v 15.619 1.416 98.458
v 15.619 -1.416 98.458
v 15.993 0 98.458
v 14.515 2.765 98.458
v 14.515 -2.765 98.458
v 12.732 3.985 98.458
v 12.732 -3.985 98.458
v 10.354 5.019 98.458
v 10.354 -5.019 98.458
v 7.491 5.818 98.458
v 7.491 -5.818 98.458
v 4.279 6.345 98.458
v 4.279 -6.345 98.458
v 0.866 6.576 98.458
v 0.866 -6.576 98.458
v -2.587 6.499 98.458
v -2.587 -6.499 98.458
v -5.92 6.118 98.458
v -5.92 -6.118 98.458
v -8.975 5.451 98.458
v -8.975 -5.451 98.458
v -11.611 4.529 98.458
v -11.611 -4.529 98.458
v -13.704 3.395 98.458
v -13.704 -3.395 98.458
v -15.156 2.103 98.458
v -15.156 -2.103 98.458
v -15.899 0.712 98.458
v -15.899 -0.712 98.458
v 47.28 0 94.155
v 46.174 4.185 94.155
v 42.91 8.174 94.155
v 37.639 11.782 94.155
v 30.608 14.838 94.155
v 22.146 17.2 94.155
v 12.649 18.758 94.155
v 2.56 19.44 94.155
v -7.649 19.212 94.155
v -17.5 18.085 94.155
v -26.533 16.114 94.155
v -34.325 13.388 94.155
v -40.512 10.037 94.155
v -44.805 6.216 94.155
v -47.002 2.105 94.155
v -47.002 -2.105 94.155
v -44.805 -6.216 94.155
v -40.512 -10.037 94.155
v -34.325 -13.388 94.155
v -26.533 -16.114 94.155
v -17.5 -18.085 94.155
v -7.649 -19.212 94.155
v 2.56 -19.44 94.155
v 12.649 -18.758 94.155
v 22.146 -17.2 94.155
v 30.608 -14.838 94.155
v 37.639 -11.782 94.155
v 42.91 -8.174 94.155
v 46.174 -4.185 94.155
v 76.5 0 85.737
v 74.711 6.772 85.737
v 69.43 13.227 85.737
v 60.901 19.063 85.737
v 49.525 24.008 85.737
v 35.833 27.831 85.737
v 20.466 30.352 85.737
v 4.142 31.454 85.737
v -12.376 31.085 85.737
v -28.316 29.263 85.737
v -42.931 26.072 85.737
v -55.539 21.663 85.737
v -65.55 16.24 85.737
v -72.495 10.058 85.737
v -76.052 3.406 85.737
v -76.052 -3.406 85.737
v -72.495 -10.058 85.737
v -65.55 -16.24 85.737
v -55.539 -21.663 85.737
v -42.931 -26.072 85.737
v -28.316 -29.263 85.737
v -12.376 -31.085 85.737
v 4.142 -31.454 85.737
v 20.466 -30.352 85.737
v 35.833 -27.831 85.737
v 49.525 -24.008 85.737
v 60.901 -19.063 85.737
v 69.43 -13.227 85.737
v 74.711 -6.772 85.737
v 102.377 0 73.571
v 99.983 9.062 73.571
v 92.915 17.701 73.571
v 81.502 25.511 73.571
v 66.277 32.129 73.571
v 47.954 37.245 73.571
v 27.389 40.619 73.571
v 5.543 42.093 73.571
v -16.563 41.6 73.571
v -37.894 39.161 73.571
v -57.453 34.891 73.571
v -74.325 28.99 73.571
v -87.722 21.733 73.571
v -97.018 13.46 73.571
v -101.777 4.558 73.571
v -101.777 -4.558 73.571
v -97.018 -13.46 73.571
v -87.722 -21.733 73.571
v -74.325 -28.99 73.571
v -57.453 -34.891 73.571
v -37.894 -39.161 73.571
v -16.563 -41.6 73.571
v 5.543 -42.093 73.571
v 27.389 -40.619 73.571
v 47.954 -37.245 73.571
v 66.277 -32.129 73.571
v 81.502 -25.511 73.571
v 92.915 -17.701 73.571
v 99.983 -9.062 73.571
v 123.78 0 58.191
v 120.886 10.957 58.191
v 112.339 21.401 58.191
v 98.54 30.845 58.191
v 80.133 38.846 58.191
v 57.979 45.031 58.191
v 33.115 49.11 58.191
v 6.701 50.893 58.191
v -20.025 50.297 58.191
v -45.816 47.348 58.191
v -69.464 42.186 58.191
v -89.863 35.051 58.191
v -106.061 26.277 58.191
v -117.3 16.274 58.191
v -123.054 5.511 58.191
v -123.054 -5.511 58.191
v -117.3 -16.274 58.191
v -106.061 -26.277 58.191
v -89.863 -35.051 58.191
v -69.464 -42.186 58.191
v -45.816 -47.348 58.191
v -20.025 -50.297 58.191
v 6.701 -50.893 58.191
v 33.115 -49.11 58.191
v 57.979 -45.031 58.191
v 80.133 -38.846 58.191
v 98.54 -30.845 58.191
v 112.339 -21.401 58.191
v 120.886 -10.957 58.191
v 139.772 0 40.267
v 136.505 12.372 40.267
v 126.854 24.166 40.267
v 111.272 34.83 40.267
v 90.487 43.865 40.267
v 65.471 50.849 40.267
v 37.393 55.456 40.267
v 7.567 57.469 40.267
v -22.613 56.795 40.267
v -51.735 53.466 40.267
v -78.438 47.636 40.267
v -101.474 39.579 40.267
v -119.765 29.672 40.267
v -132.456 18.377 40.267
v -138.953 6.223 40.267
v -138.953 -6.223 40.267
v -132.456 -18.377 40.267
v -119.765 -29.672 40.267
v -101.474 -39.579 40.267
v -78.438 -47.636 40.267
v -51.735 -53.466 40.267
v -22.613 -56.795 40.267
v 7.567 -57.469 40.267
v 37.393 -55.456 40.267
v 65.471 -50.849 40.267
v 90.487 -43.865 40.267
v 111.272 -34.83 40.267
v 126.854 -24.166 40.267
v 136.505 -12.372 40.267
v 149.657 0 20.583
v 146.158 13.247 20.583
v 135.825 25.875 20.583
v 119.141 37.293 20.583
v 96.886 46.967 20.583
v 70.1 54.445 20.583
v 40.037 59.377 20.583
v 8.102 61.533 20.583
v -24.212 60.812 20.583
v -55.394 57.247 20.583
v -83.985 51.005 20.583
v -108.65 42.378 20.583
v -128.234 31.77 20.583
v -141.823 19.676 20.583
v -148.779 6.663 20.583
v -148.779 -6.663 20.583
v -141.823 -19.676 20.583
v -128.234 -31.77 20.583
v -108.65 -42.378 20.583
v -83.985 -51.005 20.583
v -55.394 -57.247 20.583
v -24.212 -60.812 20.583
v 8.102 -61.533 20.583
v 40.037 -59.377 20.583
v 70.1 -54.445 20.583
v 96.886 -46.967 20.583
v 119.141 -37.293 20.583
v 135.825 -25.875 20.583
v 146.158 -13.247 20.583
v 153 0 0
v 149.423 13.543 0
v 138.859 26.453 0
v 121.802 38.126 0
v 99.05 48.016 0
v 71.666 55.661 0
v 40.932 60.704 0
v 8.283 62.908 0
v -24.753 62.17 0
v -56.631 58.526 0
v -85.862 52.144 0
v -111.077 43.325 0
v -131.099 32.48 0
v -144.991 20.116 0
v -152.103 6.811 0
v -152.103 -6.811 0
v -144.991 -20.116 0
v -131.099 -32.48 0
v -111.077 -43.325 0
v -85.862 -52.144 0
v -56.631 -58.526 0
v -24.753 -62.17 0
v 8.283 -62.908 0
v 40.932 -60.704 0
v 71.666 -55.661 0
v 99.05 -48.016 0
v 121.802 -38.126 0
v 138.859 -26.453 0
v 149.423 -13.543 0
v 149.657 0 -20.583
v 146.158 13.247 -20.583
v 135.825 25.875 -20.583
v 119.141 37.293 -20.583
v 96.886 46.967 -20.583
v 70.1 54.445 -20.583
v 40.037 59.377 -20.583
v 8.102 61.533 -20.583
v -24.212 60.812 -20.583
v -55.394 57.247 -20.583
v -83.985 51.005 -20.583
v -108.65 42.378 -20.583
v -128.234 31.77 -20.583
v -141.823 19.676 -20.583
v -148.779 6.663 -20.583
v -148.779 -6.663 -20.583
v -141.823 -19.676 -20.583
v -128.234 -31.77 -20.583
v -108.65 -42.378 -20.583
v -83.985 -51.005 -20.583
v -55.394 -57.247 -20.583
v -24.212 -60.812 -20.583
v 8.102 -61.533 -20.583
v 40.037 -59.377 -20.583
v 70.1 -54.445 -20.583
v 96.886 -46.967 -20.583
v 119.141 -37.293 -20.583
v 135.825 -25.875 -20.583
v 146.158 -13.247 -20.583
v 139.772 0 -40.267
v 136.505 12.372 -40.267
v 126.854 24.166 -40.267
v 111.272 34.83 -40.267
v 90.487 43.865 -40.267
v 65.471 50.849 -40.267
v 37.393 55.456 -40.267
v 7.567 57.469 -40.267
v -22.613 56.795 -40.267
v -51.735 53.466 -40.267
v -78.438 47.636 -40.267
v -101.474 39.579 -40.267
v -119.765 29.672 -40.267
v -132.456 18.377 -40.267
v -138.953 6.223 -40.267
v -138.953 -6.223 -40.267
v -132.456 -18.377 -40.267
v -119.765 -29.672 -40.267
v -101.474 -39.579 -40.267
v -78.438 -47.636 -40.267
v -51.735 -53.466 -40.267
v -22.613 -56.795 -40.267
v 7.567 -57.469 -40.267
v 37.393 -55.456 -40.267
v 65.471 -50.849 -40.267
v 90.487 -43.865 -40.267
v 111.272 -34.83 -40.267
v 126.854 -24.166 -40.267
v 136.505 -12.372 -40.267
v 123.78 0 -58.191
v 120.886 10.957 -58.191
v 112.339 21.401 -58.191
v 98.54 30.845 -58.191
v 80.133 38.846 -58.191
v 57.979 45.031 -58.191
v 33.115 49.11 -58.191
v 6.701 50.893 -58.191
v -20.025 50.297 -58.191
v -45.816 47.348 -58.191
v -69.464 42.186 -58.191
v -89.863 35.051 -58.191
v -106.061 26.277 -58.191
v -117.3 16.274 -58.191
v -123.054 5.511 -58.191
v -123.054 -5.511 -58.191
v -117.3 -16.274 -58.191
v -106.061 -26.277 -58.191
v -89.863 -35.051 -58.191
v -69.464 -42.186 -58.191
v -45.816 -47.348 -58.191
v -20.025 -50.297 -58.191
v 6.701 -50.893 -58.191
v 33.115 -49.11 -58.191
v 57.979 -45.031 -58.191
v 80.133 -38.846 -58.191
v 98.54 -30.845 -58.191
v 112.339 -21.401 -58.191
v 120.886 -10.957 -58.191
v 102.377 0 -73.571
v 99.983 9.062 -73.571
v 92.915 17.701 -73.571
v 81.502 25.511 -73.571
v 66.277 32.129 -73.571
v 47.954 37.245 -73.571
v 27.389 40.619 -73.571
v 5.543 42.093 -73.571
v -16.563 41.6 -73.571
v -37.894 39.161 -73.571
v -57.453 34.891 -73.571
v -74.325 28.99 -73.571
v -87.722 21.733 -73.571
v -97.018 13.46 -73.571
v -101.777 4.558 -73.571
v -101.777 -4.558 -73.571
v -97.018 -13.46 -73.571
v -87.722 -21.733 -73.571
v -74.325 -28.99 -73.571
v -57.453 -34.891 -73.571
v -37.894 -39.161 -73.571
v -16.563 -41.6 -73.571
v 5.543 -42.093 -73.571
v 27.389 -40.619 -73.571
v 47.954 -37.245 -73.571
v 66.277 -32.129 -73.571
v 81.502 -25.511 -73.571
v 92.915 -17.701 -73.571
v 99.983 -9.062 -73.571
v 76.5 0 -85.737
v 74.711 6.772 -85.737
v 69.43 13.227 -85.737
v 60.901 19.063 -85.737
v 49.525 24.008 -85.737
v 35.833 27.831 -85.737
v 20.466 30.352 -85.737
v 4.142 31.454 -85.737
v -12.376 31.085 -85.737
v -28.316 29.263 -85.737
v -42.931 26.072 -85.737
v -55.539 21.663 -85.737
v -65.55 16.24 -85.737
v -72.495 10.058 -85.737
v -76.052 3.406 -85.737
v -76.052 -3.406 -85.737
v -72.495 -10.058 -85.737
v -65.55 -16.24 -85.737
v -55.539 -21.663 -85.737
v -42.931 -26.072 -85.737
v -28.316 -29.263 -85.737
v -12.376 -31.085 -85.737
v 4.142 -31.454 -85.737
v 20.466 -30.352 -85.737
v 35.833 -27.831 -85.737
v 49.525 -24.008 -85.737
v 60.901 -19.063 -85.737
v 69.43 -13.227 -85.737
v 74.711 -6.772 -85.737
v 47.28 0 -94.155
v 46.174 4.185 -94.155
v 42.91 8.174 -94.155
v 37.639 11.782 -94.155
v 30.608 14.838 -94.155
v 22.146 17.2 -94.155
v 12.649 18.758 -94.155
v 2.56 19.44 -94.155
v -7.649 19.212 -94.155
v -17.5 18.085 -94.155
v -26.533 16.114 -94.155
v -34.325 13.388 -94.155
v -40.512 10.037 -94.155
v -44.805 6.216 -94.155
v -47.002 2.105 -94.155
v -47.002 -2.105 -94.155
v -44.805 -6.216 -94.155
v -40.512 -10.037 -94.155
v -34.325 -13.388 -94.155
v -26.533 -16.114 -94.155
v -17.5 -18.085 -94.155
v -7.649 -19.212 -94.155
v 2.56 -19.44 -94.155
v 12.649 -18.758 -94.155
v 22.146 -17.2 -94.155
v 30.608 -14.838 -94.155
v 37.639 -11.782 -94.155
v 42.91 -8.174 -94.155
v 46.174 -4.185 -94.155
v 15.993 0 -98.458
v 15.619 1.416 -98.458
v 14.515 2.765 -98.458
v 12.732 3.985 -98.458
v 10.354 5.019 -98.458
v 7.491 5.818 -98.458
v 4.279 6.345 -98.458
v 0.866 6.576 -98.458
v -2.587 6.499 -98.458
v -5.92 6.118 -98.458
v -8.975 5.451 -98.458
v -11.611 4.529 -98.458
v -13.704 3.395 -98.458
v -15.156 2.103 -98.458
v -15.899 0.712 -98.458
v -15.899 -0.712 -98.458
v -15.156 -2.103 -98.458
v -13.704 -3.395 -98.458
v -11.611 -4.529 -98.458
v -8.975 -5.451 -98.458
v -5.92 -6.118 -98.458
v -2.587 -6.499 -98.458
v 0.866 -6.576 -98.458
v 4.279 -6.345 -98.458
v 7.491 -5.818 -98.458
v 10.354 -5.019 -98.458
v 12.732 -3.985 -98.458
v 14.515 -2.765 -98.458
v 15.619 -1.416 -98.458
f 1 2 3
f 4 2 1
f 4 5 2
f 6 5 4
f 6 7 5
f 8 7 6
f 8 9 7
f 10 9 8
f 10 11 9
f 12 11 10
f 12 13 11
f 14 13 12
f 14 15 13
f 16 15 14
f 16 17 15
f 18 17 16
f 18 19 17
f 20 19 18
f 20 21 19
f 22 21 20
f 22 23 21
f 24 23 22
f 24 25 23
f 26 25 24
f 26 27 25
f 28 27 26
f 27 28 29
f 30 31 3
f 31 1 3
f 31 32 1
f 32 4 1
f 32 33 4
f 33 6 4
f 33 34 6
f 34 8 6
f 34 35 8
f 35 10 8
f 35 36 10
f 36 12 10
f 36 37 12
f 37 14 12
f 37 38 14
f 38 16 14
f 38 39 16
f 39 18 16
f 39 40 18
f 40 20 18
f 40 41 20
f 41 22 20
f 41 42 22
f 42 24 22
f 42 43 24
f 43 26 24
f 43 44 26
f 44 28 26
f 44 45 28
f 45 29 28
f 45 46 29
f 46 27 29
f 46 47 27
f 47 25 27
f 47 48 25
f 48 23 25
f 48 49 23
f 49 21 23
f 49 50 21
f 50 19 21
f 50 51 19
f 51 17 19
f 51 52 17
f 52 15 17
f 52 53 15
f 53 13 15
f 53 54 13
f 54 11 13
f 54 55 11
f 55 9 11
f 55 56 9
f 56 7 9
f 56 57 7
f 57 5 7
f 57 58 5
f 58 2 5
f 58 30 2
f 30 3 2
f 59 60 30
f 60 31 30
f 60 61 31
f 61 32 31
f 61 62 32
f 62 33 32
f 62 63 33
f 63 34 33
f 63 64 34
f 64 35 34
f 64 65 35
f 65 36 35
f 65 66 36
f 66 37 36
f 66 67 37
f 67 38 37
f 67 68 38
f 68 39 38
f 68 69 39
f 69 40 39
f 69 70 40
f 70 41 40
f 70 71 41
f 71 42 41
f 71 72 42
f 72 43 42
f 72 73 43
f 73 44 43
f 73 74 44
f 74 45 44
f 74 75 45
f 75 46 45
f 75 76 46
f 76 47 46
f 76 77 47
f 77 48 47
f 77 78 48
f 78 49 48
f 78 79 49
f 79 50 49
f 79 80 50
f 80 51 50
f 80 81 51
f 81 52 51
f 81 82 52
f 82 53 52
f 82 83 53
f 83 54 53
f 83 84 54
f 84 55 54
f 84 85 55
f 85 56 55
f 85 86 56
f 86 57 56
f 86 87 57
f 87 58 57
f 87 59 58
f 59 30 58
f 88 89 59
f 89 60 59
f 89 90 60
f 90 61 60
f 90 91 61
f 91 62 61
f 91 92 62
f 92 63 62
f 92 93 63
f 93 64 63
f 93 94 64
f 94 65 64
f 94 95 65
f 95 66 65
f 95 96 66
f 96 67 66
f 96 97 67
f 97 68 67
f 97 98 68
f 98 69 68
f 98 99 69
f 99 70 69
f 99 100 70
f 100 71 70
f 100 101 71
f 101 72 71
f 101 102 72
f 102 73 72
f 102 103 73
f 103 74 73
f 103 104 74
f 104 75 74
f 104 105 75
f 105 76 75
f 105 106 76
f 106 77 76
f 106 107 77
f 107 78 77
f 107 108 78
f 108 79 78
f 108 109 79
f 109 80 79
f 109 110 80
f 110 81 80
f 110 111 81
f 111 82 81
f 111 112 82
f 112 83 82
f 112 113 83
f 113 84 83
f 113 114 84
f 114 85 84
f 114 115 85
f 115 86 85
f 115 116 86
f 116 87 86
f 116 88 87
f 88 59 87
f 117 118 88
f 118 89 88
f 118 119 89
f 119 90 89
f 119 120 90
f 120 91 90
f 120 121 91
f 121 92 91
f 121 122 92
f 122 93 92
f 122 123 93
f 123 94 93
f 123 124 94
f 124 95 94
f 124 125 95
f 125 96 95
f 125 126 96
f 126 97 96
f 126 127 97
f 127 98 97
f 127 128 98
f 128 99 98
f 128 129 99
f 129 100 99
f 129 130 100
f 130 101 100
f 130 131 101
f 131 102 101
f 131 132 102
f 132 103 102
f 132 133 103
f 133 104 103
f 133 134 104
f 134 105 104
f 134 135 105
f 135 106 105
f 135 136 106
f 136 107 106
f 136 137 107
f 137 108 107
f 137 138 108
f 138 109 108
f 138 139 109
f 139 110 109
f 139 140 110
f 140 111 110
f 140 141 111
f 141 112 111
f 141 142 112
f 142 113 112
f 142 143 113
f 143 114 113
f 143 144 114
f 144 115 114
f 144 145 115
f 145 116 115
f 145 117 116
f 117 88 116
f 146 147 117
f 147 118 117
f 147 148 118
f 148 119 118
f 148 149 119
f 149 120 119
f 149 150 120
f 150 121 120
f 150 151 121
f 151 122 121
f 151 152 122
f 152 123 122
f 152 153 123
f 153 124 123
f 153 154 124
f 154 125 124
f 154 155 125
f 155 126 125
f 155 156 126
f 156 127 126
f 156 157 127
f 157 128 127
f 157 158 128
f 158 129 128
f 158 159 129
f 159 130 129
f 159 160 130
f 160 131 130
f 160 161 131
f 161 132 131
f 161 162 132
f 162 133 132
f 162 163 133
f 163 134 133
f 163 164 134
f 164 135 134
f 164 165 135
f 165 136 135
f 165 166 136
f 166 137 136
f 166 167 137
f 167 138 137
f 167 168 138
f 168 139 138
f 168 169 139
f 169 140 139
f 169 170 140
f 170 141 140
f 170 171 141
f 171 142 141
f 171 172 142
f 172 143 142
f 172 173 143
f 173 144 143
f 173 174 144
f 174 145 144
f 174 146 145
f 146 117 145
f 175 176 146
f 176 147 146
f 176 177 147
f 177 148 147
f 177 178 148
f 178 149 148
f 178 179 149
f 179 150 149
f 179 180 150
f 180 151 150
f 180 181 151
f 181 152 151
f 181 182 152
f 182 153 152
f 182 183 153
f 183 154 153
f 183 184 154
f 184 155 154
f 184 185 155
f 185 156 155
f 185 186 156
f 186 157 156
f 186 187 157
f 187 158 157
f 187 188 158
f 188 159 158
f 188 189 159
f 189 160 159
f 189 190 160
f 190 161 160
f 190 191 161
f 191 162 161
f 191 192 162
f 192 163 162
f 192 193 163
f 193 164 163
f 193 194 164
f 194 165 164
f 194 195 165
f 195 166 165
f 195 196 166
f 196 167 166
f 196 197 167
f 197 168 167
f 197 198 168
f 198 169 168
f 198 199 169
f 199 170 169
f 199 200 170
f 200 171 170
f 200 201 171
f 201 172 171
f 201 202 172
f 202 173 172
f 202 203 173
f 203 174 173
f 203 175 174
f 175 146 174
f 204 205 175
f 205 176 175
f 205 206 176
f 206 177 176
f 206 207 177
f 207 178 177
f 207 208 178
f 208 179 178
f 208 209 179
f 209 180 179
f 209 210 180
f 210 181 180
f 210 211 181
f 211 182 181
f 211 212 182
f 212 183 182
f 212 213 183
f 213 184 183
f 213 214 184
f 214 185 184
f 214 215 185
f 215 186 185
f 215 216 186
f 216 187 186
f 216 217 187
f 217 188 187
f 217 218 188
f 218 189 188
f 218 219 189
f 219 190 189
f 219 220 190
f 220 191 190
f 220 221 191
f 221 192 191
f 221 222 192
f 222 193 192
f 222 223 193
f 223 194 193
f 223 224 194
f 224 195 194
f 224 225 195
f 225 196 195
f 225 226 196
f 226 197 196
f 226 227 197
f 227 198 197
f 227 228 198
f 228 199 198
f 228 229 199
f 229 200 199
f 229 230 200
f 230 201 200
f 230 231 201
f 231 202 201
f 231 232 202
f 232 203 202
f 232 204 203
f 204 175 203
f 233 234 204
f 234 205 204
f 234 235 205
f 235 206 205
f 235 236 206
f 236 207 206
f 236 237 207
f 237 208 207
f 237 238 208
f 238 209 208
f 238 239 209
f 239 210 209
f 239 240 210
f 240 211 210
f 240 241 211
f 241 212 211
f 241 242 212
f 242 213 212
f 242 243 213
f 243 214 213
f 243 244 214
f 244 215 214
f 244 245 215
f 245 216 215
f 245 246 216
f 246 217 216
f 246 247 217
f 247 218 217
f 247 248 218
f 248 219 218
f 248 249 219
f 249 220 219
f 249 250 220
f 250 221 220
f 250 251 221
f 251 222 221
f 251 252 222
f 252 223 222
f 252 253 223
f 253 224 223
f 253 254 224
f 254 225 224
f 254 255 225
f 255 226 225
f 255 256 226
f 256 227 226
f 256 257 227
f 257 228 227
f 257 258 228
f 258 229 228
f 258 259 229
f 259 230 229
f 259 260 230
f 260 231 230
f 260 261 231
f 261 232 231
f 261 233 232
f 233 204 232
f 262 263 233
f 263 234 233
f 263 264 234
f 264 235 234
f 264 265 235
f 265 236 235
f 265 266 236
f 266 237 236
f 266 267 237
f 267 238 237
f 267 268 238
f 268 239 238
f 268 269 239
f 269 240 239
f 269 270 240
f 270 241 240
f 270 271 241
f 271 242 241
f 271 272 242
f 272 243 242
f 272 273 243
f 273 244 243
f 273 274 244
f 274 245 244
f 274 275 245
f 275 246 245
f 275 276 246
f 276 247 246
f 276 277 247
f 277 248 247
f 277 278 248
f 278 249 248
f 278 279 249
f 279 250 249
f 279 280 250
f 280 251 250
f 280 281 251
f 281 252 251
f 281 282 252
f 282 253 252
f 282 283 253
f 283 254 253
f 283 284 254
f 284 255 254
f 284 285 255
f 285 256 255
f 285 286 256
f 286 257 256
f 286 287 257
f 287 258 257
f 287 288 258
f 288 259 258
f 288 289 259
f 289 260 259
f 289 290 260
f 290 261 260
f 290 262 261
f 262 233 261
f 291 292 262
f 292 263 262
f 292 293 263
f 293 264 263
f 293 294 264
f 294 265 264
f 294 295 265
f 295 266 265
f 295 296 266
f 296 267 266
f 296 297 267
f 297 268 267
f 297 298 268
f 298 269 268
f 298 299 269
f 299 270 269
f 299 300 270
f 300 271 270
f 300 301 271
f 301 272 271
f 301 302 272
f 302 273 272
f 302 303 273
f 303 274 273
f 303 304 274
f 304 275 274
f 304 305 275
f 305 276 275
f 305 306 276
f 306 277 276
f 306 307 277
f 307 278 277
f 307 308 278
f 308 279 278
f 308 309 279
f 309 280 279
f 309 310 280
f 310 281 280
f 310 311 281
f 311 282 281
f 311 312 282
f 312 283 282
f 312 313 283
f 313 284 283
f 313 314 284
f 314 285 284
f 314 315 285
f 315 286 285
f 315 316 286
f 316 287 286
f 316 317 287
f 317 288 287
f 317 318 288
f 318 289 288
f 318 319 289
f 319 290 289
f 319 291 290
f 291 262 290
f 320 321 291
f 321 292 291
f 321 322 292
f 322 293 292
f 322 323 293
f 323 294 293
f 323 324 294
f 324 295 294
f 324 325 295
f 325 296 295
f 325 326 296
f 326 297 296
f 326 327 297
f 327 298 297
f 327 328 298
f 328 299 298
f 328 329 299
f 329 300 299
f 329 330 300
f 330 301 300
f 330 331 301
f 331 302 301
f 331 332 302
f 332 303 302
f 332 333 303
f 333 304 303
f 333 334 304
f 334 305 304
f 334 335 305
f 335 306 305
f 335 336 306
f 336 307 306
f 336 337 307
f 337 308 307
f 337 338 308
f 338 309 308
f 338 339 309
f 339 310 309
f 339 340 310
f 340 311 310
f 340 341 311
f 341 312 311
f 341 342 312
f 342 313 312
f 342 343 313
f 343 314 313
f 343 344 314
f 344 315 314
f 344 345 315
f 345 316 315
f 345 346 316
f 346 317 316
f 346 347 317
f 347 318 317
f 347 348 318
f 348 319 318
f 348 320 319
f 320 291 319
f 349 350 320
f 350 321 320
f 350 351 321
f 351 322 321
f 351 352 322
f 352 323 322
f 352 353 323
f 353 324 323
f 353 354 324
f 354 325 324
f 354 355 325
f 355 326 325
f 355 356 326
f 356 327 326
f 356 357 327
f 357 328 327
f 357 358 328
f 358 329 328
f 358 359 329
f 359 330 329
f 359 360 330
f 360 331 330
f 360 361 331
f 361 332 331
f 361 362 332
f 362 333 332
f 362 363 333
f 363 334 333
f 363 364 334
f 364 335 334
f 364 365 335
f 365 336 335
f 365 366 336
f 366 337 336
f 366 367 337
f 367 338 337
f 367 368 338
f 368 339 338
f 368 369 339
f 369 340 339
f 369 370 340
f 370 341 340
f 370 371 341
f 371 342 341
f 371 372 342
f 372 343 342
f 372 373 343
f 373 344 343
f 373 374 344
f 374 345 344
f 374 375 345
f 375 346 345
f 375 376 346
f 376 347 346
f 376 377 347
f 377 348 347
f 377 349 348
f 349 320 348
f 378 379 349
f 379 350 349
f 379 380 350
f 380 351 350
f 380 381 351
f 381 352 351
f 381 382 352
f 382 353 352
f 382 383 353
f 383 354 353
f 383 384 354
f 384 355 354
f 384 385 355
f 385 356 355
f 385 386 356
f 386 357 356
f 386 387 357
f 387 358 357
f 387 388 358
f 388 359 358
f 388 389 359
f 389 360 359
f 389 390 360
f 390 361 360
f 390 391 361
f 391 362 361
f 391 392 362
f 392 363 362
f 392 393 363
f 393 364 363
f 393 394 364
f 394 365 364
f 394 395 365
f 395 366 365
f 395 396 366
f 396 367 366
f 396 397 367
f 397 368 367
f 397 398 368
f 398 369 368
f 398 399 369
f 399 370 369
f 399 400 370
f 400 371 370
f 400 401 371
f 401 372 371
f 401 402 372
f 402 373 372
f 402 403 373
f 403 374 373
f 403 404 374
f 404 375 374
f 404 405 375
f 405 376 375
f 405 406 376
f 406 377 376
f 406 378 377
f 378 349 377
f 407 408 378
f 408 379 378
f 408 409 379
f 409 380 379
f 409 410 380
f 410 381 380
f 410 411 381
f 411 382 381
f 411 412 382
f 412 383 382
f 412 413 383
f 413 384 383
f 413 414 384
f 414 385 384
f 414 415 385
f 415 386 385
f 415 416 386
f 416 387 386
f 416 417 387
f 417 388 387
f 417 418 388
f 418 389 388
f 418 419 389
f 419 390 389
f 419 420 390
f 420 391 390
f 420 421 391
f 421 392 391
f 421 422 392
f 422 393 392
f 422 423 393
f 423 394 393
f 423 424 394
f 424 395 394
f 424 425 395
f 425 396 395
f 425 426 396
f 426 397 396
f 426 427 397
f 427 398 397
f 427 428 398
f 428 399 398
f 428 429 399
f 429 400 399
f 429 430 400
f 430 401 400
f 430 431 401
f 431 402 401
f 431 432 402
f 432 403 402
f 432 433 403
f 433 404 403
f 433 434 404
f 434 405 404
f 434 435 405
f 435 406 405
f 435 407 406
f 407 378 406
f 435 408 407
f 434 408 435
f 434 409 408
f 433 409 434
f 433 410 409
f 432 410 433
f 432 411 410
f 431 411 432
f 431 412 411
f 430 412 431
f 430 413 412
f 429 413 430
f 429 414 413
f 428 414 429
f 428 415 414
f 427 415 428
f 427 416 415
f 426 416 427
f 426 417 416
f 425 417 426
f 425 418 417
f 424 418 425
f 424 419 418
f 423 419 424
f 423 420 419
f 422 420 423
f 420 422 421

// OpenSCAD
// Generated by SolidPython 1.0.1 on 2020-07-29 00:46:52


scale(v = [17, 7, 11]) {
	sphere(r = 9);
}
/***********************************************
*********      SolidPython code:      **********
************************************************
 
# import packages: SolidPython
from solid import *
from solid.utils import *
from itertools import chain, combinations, permutations


class Resize:

    def __init__(self, scad_file):
        self.scad_file = scad_file
        #self.scad_file = import_scad(scad_file)
        # cone/cylinder param:
        self.r1 = 0
        self.r2 = 0
        self.h = 0
        # rectangular prism param:
        self.w = 0
        self.l = 0
        # ellipse param:
        self.r = 0

    # import OpenScad code (file name corresponds to shape)


    # classify shape + parameters
    def assign(self, param1, param2, param3):
        if self.scad_file == 'cone.scad':
            self.r1 = param1
            self.r2 = param2
            self.h = param3
        elif self.scad_file == 'cylinder.scad':
            self.r1 = param1
            self.r2 = param2
            self.h = param3
        elif self.scad_file == 'rectangularPrism.scad':
            self.h = param1
            self.l = param2
            self.w = param3
        else:
            self.r = param1
            self.h = param2

    # resize parameters
    def iterate(self):
        x = range(3, 20, 2)
        i = 1
        if self.scad_file == 'cone.scad':
            tempList = list(permutations(x, 2))
            for temp in tempList:
                param1 = temp[0]
                param2 = temp[1]
                filepath = 'produced_scad_files/' + 'cone' + str(param1) + '_' + str(param2) + '_' + '.scad'
                scad_render_to_file(cylinder(h=param1, r1=param2, r2=0), filepath)

        elif self.scad_file == 'cylinder.scad':
            tempList = list(permutations(x, 3))
            for temp in tempList:
                param1 = temp[0]
                param2 = temp[1]
                filepath = 'produced_scad_files/' + 'cylinder' + str(param1) + '_' + str(param2) + '_' + '.scad'
                scad_render_to_file(cylinder(h=param1, r1=param2, r2=param2), filepath)

        elif self.scad_file == 'rectangularPrism.scad':
            tempList = list(permutations(x, 3))
            for temp in tempList:
                param1 = temp[0]
                param2 = temp[1]
                param3 = temp[2]
                filepath = 'produced_scad_files/' + 'rectangularPrism' + str(param1) + '_' + str(param2) + '_' + str(
                    param3) + '.scad'
                scad_render_to_file(cube(size=(param1, param2, param3)), filepath)

        elif self.scad_file == 'ellipse.scad':
            tempList = list(permutations(x, 4))
            for temp in tempList:
                param1 = temp[0]
                param2 = temp[1]
                param3 = temp[2]
                param4 = temp[3]
                filepath = 'produced_scad_files/' + 'ellipse' + str(param1) + '_' + str(param2) + '_' + str(param3) + '_' + str(param4) + '.scad'
                scad_render_to_file(scale([param1, param2, param3])(sphere(r=param4)), filepath)

    def render_to_scadfile(self):
        scad_render_to_file(scad, 'example.scad') 
 
************************************************/
